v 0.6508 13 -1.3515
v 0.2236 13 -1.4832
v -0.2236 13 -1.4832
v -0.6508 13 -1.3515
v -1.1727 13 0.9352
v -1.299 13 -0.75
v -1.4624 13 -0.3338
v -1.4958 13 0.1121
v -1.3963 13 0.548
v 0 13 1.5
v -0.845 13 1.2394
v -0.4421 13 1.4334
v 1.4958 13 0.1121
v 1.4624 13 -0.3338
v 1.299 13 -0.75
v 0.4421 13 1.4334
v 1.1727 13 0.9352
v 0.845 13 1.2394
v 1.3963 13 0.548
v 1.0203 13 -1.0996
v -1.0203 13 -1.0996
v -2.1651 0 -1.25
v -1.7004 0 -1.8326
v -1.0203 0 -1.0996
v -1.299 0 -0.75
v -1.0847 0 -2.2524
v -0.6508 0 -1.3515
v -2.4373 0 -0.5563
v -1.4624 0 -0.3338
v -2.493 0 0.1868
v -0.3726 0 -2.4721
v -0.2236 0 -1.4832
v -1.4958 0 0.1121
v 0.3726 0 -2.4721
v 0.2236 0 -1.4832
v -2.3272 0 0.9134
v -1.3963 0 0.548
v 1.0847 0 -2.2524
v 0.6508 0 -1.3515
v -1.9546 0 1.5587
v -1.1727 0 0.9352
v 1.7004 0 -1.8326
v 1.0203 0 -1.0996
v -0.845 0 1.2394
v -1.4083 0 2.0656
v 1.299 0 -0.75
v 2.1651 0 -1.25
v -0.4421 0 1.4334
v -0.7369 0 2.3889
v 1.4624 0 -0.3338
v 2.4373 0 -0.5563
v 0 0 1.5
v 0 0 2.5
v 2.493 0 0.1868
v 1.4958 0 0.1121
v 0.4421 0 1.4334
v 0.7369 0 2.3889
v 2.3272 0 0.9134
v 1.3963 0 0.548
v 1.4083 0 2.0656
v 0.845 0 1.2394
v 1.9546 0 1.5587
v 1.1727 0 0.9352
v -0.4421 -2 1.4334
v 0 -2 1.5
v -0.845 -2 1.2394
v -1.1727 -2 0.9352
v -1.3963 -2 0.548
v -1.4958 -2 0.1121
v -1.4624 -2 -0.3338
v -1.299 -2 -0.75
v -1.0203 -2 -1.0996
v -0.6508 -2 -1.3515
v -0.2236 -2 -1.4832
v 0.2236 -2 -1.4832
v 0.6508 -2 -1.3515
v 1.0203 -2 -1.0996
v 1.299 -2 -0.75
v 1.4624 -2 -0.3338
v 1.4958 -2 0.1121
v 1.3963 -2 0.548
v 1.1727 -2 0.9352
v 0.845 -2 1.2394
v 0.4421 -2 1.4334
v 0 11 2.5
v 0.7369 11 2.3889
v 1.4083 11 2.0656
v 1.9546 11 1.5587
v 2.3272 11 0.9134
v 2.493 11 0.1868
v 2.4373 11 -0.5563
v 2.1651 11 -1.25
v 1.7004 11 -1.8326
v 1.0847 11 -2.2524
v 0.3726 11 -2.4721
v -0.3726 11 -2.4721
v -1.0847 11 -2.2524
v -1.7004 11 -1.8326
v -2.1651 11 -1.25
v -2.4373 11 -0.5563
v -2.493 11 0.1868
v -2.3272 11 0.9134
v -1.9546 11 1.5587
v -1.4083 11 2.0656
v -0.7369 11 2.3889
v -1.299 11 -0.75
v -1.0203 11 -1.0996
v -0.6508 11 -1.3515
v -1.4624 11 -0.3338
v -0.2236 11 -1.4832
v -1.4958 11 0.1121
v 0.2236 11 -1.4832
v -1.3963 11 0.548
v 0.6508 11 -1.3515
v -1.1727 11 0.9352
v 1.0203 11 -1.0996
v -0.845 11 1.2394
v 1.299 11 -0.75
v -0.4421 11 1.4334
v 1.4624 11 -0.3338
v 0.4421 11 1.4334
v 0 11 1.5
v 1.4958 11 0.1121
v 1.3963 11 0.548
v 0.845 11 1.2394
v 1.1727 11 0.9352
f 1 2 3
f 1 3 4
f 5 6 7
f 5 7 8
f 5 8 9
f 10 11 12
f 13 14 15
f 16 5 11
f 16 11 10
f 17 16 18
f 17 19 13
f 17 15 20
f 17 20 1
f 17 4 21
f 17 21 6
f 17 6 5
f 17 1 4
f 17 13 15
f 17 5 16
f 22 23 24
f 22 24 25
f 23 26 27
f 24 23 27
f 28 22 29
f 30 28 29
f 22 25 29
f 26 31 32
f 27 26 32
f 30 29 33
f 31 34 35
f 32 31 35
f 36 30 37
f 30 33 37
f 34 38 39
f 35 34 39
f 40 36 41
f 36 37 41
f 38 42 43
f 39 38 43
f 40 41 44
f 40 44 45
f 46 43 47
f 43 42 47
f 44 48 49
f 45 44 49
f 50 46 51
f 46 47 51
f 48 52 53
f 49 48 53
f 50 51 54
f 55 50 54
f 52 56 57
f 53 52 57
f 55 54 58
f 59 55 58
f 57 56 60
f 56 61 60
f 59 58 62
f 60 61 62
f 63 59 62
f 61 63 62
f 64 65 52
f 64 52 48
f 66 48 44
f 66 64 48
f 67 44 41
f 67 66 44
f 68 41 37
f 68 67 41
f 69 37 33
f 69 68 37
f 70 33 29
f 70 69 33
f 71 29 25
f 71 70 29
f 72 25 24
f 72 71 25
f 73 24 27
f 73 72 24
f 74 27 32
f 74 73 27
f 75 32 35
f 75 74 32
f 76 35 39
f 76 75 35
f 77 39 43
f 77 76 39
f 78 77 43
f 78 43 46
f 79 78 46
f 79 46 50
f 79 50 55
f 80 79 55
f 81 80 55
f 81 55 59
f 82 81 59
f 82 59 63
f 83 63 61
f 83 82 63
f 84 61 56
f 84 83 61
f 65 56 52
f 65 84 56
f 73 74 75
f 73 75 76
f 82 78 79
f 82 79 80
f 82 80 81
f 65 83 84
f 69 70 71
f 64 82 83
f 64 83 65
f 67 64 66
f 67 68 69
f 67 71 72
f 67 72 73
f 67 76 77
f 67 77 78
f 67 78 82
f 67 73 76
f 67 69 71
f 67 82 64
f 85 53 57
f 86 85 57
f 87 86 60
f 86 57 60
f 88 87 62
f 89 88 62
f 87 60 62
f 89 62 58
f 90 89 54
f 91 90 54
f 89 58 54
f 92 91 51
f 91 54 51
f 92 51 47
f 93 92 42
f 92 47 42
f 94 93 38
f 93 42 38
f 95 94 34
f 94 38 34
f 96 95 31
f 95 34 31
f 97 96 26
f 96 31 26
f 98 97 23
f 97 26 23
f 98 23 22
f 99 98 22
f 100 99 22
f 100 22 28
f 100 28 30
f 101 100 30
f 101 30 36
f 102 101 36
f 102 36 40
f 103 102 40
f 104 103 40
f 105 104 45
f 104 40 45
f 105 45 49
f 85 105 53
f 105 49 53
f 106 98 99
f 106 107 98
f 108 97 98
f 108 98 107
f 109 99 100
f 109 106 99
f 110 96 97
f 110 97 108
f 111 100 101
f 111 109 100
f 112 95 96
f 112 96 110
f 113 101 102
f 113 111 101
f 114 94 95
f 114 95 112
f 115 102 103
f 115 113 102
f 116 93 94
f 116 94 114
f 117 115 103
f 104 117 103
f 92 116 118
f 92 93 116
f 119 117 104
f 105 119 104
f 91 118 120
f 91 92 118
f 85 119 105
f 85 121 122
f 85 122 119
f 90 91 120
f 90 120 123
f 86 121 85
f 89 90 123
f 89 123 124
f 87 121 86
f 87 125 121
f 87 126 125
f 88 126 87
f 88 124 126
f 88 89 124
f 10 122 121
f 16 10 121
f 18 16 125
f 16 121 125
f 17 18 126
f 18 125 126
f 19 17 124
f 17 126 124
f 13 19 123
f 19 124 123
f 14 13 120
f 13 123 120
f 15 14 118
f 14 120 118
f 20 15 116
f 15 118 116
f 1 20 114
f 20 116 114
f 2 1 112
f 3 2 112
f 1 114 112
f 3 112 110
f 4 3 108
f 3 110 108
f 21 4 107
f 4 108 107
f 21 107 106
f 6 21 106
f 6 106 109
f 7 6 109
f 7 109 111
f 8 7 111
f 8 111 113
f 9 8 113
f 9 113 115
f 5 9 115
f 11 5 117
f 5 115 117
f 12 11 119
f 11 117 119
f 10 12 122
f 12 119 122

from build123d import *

# Parameters (mm, degrees)
SKETCH_1_R      = 2.5
EXTRUDE_1_DEPTH = 11
SKETCH_2_R      = 1.5
EXTRUDE_2_DEPTH = 2
EXTRUDE_START   = 2
SKETCH_4_R      = 1.5
EXTRUDE_3_DEPTH = 2


with BuildPart() as part:
    # Эскиз1 → Бобышка-Вытянуть1 (new body)
    with BuildSketch(Plane(origin=(0, 0, 0), x_dir=(1, 0, 0), z_dir=(0, 1, 0))):
        with Locations(Location((0, 0, 0), (0, 0, 270))):
            Circle(SKETCH_1_R)
    extrude(amount=EXTRUDE_1_DEPTH)

    # Эскиз2 → Бобышка-Вытянуть2 (add)
    with BuildSketch(Plane(origin=(0, 11, 0), x_dir=(1, 0, 0), z_dir=(0, 1, 0))):
        with Locations(Location((0, 0, 0), (0, 0, 270))):
            Circle(SKETCH_2_R)
    extrude(amount=EXTRUDE_2_DEPTH)

    # Эскиз4 → Бобышка-Вытянуть3 (add)
    with BuildSketch(Plane.XZ.offset(EXTRUDE_START)):
        with Locations(Location((0, 0, 0), (0, 0, 90))):
            Circle(SKETCH_4_R)
    extrude(amount=-EXTRUDE_3_DEPTH)


solid = part.part
